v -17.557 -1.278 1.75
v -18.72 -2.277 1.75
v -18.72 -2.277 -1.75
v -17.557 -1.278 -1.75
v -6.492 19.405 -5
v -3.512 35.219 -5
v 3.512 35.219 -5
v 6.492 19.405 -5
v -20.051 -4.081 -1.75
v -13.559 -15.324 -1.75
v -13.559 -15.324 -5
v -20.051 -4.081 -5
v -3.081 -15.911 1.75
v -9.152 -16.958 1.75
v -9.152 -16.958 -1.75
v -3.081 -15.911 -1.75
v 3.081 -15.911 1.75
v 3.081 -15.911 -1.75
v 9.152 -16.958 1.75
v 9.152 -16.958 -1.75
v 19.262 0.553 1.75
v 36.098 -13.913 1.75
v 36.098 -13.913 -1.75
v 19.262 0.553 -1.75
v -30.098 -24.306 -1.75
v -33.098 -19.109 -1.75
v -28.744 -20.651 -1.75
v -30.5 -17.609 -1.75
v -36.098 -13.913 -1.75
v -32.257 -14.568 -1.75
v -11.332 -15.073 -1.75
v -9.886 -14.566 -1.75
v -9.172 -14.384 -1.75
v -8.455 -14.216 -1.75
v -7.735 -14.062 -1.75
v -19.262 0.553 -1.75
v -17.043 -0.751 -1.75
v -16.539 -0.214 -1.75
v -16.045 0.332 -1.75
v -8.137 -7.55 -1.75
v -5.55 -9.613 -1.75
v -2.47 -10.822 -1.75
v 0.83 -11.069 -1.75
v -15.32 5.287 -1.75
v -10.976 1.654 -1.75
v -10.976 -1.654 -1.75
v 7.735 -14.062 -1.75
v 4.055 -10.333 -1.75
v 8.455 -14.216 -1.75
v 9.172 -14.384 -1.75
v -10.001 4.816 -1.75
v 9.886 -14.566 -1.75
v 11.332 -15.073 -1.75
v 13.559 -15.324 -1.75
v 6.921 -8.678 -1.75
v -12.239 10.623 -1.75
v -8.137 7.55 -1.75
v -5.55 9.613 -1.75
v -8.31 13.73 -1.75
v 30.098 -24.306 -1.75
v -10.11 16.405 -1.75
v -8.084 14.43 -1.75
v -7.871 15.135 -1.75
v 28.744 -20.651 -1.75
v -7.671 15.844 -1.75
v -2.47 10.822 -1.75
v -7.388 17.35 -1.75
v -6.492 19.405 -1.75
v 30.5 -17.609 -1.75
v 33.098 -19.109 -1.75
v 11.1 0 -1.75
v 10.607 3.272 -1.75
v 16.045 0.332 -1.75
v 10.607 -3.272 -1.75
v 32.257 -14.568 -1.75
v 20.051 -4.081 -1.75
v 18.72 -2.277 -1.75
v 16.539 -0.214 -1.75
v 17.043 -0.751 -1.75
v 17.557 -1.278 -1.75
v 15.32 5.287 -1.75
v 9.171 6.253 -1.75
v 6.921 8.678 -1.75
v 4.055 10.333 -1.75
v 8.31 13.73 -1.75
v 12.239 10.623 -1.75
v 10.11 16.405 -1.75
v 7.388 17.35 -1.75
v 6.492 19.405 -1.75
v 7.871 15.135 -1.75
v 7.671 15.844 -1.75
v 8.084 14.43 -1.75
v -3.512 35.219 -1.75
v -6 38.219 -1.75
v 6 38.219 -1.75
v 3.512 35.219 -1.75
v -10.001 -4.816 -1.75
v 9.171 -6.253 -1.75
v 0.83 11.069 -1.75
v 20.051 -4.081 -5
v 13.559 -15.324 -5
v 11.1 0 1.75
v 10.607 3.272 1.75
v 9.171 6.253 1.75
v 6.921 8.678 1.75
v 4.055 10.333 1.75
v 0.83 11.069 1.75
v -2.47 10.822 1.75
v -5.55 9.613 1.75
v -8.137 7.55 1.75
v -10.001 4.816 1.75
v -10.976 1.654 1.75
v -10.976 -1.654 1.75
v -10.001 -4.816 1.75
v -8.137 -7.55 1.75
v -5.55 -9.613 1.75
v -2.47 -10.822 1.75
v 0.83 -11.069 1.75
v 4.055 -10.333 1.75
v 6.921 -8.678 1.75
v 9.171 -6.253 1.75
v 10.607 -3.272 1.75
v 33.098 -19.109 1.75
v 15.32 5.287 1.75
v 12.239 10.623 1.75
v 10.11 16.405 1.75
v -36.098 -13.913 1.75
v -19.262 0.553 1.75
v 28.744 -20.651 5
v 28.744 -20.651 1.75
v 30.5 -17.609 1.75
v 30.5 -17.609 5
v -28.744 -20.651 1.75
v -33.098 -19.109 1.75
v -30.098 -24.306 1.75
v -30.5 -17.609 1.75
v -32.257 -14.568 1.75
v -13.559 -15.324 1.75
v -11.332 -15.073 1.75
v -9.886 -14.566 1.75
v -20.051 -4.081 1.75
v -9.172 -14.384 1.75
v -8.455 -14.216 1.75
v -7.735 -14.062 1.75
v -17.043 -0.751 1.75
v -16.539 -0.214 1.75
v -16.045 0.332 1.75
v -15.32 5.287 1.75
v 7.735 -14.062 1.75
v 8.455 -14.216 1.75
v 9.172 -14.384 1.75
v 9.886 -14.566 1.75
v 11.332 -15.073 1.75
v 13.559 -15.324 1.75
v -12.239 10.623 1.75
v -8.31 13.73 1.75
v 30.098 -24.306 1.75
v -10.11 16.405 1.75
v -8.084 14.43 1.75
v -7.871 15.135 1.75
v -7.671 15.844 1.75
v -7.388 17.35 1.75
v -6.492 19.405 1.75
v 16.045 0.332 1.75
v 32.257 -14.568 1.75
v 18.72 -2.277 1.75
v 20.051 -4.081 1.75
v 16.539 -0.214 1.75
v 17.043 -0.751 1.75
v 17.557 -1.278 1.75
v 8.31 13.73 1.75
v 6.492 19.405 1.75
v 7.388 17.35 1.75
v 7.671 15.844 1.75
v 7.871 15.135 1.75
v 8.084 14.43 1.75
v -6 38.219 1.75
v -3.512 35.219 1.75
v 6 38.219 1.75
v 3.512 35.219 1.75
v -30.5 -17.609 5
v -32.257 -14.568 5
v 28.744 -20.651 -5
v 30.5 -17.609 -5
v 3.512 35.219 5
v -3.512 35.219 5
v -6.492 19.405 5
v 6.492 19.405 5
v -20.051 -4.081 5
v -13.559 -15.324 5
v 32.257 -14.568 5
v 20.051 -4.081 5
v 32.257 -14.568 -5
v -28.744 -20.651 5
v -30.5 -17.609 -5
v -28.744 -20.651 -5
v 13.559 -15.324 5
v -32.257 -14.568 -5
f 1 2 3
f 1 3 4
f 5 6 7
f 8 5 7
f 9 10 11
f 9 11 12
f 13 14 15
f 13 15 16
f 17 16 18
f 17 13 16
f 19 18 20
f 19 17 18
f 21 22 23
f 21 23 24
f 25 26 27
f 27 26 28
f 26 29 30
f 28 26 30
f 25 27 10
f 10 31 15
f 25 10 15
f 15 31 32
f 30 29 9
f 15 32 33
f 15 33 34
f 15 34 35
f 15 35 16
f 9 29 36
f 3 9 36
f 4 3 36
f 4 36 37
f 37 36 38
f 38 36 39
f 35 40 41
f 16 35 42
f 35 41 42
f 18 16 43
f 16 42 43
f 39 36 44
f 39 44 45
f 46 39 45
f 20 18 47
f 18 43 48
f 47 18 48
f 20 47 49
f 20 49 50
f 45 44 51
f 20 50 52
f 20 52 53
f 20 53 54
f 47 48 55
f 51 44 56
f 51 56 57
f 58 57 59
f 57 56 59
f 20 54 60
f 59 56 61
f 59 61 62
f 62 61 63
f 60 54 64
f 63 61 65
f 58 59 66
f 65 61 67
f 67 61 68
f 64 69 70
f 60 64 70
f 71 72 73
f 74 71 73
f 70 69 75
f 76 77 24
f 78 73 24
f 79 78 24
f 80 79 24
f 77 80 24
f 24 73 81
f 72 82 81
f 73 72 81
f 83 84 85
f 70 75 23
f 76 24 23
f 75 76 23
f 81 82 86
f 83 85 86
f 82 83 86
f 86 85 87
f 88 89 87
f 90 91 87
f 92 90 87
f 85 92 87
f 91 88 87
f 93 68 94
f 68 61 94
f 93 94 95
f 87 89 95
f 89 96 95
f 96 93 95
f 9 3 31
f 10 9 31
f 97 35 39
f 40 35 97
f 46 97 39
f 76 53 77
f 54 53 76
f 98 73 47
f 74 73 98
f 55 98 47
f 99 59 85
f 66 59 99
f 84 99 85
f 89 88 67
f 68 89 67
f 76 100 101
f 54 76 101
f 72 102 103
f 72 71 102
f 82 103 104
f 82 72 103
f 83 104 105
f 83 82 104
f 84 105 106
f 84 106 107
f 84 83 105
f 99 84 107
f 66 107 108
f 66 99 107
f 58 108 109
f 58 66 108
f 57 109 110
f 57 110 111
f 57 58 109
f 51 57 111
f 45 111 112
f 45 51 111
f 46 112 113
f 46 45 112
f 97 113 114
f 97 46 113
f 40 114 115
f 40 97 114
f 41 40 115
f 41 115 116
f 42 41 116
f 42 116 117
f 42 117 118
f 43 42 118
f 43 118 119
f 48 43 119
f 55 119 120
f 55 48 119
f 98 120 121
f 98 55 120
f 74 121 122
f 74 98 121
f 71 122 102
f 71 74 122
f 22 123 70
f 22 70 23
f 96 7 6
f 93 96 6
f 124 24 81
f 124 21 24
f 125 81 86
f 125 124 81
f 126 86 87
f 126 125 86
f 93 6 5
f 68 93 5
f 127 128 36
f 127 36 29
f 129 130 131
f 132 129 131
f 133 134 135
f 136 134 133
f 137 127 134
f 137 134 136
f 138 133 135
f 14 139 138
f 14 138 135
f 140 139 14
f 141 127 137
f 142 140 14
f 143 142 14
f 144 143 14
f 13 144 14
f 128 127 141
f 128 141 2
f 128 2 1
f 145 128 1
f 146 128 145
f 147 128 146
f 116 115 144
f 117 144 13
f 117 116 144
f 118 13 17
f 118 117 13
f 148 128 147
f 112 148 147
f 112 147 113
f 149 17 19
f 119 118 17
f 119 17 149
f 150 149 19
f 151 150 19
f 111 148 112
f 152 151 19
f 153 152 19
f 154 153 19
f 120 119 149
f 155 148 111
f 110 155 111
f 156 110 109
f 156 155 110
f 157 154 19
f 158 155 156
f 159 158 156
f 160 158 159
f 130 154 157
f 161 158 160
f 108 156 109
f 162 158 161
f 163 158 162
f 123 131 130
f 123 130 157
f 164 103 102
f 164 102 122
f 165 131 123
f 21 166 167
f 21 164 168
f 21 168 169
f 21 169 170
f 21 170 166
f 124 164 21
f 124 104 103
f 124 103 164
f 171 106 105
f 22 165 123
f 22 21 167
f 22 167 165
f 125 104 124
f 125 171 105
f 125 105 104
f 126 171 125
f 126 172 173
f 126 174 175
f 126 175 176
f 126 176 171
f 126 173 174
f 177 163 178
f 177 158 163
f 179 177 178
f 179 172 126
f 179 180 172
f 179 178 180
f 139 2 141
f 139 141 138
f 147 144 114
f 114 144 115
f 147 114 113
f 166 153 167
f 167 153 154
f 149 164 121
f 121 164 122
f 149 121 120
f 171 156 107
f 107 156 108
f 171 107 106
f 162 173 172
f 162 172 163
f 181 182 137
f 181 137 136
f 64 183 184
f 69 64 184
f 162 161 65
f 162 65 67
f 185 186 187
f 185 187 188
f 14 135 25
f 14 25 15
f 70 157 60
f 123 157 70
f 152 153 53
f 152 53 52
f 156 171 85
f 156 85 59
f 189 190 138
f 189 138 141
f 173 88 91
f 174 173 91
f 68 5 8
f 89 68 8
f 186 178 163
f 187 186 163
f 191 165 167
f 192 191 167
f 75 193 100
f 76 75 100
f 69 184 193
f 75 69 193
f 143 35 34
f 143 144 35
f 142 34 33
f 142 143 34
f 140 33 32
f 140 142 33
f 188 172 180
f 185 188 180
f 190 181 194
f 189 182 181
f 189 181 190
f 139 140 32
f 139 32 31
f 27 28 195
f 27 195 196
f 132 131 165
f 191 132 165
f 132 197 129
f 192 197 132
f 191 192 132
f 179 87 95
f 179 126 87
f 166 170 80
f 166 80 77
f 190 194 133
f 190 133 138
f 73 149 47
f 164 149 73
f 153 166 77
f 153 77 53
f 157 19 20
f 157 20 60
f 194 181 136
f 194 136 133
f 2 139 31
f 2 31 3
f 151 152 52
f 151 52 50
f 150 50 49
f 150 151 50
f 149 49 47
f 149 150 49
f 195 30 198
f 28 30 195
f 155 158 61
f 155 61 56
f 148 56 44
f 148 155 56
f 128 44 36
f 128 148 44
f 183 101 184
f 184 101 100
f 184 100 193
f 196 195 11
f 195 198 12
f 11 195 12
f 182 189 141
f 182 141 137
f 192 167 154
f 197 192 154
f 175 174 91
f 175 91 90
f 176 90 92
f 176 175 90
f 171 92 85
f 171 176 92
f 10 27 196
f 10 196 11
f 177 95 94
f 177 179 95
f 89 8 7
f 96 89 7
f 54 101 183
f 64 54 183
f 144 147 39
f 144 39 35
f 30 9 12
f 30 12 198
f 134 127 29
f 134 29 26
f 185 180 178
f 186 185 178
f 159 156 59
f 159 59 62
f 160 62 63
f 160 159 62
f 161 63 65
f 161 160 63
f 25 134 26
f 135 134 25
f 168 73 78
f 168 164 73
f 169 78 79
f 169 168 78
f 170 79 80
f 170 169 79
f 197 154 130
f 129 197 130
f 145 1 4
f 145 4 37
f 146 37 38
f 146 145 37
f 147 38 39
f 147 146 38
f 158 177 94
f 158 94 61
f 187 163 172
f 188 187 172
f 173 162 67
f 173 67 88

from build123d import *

# Parameters (mm, degrees)
F0_R     = 11.1
F1_DEPTH = 1.75
F2_DEPTH = 5


with BuildPart() as f1:
    # F0 (on Top) → F1 (new body, symmetric)
    with BuildSketch(Plane.XY):
        with BuildLine():
            Line((6, 38.218746), (0, 38.218746))
            Line((0, 38.218746), (-6, 38.218746))
            Line((-6, 38.218746), (-10.109618, 16.405044))
            ThreePointArc((-10.109618, 16.405044), (-13.665242, 7.889631), (-19.261994, 0.552664))
            Line((-19.261994, 0.552664), (-36.098405, -13.91322))
            Line((-36.098405, -13.91322), (-33.098405, -19.109373))
            Line((-33.098405, -19.109373), (-30.098405, -24.305525))
            Line((-30.098405, -24.305525), (-9.152376, -16.957708))
            ThreePointArc((-9.152376, -16.957708), (0, -15.779262), (9.152376, -16.957708))
            Line((9.152376, -16.957708), (30.098405, -24.305525))
            Line((30.098405, -24.305525), (33.098405, -19.109373))
            Line((33.098405, -19.109373), (36.098405, -13.91322))
            Line((36.098405, -13.91322), (19.261994, 0.552664))
            ThreePointArc((19.261994, 0.552664), (13.665242, 7.889631), (10.109618, 16.405044))
            Line((10.109618, 16.405044), (6, 38.218746))
        make_face()
        Polygon((-30.500328, -17.609373), (-32.256535, -14.567534), (-20.051088, -4.080584), (-13.559434, -15.32446), (-28.744122, -20.651212), align=None, mode=Mode.SUBTRACT)
        with BuildLine():
            Line((-9.885613, -14.565564), (-11.332004, -15.072955))
            Line((-11.332004, -15.072955), (-18.719564, -2.277326))
            Line((-18.719564, -2.277326), (-17.556955, -1.27841))
            ThreePointArc((-17.556955, -1.27841), (-16.789561, -0.483972), (-16.045193, 0.33208))
            Line((-16.045193, 0.33208), (-7.735007, -14.061585))
            ThreePointArc((-7.735007, -14.061585), (-8.813913, -14.2982), (-9.885613, -14.565564))
        make_face(mode=Mode.SUBTRACT)
        Circle(F0_R, mode=Mode.SUBTRACT)
        Polygon((30.500328, -17.609373), (28.744122, -20.651212), (13.559434, -15.32446), (20.051088, -4.080584), (32.256535, -14.567534), align=None, mode=Mode.SUBTRACT)
        with BuildLine():
            Line((17.556955, -1.27841), (18.719564, -2.277326))
            Line((18.719564, -2.277326), (11.332004, -15.072955))
            Line((11.332004, -15.072955), (9.885613, -14.565564))
            ThreePointArc((9.885613, -14.565564), (8.813913, -14.2982), (7.735007, -14.061585))
            Line((7.735007, -14.061585), (16.045193, 0.33208))
            ThreePointArc((16.045193, 0.33208), (16.789561, -0.483972), (17.556955, -1.27841))
        make_face(mode=Mode.SUBTRACT)
        with BuildLine():
            Line((8.310186, 13.729505), (-8.310186, 13.729505))
            ThreePointArc((-8.310186, 13.729505), (-7.975648, 14.782172), (-7.671342, 15.843974))
            Line((-7.671342, 15.843974), (-7.38756, 17.350281))
            Line((-7.38756, 17.350281), (7.38756, 17.350281))
            Line((7.38756, 17.350281), (7.671342, 15.843974))
            ThreePointArc((7.671342, 15.843974), (7.975648, 14.782172), (8.310186, 13.729505))
        make_face(mode=Mode.SUBTRACT)
        Polygon((6.491654, 19.405044), (-6.491654, 19.405044), (-3.512413, 35.218746), (0, 35.218746), (3.512413, 35.218746), align=None, mode=Mode.SUBTRACT)
    extrude(amount=F1_DEPTH, both=True)

    # F0 (on Top) → F2 (join, symmetric)
    with BuildSketch(Plane.XY):
        Polygon((13.559434, -15.32446), (28.744122, -20.651212), (30.500328, -17.609373), (32.256535, -14.567534), (20.051088, -4.080584), align=None)
        Polygon((-3.512413, 35.218746), (-6.491654, 19.405044), (6.491654, 19.405044), (3.512413, 35.218746), (0, 35.218746), align=None)
        Polygon((-20.051088, -4.080584), (-32.256535, -14.567534), (-30.500328, -17.609373), (-28.744122, -20.651212), (-13.559434, -15.32446), align=None)
    extrude(amount=F2_DEPTH, both=True)


solid = f1.part
